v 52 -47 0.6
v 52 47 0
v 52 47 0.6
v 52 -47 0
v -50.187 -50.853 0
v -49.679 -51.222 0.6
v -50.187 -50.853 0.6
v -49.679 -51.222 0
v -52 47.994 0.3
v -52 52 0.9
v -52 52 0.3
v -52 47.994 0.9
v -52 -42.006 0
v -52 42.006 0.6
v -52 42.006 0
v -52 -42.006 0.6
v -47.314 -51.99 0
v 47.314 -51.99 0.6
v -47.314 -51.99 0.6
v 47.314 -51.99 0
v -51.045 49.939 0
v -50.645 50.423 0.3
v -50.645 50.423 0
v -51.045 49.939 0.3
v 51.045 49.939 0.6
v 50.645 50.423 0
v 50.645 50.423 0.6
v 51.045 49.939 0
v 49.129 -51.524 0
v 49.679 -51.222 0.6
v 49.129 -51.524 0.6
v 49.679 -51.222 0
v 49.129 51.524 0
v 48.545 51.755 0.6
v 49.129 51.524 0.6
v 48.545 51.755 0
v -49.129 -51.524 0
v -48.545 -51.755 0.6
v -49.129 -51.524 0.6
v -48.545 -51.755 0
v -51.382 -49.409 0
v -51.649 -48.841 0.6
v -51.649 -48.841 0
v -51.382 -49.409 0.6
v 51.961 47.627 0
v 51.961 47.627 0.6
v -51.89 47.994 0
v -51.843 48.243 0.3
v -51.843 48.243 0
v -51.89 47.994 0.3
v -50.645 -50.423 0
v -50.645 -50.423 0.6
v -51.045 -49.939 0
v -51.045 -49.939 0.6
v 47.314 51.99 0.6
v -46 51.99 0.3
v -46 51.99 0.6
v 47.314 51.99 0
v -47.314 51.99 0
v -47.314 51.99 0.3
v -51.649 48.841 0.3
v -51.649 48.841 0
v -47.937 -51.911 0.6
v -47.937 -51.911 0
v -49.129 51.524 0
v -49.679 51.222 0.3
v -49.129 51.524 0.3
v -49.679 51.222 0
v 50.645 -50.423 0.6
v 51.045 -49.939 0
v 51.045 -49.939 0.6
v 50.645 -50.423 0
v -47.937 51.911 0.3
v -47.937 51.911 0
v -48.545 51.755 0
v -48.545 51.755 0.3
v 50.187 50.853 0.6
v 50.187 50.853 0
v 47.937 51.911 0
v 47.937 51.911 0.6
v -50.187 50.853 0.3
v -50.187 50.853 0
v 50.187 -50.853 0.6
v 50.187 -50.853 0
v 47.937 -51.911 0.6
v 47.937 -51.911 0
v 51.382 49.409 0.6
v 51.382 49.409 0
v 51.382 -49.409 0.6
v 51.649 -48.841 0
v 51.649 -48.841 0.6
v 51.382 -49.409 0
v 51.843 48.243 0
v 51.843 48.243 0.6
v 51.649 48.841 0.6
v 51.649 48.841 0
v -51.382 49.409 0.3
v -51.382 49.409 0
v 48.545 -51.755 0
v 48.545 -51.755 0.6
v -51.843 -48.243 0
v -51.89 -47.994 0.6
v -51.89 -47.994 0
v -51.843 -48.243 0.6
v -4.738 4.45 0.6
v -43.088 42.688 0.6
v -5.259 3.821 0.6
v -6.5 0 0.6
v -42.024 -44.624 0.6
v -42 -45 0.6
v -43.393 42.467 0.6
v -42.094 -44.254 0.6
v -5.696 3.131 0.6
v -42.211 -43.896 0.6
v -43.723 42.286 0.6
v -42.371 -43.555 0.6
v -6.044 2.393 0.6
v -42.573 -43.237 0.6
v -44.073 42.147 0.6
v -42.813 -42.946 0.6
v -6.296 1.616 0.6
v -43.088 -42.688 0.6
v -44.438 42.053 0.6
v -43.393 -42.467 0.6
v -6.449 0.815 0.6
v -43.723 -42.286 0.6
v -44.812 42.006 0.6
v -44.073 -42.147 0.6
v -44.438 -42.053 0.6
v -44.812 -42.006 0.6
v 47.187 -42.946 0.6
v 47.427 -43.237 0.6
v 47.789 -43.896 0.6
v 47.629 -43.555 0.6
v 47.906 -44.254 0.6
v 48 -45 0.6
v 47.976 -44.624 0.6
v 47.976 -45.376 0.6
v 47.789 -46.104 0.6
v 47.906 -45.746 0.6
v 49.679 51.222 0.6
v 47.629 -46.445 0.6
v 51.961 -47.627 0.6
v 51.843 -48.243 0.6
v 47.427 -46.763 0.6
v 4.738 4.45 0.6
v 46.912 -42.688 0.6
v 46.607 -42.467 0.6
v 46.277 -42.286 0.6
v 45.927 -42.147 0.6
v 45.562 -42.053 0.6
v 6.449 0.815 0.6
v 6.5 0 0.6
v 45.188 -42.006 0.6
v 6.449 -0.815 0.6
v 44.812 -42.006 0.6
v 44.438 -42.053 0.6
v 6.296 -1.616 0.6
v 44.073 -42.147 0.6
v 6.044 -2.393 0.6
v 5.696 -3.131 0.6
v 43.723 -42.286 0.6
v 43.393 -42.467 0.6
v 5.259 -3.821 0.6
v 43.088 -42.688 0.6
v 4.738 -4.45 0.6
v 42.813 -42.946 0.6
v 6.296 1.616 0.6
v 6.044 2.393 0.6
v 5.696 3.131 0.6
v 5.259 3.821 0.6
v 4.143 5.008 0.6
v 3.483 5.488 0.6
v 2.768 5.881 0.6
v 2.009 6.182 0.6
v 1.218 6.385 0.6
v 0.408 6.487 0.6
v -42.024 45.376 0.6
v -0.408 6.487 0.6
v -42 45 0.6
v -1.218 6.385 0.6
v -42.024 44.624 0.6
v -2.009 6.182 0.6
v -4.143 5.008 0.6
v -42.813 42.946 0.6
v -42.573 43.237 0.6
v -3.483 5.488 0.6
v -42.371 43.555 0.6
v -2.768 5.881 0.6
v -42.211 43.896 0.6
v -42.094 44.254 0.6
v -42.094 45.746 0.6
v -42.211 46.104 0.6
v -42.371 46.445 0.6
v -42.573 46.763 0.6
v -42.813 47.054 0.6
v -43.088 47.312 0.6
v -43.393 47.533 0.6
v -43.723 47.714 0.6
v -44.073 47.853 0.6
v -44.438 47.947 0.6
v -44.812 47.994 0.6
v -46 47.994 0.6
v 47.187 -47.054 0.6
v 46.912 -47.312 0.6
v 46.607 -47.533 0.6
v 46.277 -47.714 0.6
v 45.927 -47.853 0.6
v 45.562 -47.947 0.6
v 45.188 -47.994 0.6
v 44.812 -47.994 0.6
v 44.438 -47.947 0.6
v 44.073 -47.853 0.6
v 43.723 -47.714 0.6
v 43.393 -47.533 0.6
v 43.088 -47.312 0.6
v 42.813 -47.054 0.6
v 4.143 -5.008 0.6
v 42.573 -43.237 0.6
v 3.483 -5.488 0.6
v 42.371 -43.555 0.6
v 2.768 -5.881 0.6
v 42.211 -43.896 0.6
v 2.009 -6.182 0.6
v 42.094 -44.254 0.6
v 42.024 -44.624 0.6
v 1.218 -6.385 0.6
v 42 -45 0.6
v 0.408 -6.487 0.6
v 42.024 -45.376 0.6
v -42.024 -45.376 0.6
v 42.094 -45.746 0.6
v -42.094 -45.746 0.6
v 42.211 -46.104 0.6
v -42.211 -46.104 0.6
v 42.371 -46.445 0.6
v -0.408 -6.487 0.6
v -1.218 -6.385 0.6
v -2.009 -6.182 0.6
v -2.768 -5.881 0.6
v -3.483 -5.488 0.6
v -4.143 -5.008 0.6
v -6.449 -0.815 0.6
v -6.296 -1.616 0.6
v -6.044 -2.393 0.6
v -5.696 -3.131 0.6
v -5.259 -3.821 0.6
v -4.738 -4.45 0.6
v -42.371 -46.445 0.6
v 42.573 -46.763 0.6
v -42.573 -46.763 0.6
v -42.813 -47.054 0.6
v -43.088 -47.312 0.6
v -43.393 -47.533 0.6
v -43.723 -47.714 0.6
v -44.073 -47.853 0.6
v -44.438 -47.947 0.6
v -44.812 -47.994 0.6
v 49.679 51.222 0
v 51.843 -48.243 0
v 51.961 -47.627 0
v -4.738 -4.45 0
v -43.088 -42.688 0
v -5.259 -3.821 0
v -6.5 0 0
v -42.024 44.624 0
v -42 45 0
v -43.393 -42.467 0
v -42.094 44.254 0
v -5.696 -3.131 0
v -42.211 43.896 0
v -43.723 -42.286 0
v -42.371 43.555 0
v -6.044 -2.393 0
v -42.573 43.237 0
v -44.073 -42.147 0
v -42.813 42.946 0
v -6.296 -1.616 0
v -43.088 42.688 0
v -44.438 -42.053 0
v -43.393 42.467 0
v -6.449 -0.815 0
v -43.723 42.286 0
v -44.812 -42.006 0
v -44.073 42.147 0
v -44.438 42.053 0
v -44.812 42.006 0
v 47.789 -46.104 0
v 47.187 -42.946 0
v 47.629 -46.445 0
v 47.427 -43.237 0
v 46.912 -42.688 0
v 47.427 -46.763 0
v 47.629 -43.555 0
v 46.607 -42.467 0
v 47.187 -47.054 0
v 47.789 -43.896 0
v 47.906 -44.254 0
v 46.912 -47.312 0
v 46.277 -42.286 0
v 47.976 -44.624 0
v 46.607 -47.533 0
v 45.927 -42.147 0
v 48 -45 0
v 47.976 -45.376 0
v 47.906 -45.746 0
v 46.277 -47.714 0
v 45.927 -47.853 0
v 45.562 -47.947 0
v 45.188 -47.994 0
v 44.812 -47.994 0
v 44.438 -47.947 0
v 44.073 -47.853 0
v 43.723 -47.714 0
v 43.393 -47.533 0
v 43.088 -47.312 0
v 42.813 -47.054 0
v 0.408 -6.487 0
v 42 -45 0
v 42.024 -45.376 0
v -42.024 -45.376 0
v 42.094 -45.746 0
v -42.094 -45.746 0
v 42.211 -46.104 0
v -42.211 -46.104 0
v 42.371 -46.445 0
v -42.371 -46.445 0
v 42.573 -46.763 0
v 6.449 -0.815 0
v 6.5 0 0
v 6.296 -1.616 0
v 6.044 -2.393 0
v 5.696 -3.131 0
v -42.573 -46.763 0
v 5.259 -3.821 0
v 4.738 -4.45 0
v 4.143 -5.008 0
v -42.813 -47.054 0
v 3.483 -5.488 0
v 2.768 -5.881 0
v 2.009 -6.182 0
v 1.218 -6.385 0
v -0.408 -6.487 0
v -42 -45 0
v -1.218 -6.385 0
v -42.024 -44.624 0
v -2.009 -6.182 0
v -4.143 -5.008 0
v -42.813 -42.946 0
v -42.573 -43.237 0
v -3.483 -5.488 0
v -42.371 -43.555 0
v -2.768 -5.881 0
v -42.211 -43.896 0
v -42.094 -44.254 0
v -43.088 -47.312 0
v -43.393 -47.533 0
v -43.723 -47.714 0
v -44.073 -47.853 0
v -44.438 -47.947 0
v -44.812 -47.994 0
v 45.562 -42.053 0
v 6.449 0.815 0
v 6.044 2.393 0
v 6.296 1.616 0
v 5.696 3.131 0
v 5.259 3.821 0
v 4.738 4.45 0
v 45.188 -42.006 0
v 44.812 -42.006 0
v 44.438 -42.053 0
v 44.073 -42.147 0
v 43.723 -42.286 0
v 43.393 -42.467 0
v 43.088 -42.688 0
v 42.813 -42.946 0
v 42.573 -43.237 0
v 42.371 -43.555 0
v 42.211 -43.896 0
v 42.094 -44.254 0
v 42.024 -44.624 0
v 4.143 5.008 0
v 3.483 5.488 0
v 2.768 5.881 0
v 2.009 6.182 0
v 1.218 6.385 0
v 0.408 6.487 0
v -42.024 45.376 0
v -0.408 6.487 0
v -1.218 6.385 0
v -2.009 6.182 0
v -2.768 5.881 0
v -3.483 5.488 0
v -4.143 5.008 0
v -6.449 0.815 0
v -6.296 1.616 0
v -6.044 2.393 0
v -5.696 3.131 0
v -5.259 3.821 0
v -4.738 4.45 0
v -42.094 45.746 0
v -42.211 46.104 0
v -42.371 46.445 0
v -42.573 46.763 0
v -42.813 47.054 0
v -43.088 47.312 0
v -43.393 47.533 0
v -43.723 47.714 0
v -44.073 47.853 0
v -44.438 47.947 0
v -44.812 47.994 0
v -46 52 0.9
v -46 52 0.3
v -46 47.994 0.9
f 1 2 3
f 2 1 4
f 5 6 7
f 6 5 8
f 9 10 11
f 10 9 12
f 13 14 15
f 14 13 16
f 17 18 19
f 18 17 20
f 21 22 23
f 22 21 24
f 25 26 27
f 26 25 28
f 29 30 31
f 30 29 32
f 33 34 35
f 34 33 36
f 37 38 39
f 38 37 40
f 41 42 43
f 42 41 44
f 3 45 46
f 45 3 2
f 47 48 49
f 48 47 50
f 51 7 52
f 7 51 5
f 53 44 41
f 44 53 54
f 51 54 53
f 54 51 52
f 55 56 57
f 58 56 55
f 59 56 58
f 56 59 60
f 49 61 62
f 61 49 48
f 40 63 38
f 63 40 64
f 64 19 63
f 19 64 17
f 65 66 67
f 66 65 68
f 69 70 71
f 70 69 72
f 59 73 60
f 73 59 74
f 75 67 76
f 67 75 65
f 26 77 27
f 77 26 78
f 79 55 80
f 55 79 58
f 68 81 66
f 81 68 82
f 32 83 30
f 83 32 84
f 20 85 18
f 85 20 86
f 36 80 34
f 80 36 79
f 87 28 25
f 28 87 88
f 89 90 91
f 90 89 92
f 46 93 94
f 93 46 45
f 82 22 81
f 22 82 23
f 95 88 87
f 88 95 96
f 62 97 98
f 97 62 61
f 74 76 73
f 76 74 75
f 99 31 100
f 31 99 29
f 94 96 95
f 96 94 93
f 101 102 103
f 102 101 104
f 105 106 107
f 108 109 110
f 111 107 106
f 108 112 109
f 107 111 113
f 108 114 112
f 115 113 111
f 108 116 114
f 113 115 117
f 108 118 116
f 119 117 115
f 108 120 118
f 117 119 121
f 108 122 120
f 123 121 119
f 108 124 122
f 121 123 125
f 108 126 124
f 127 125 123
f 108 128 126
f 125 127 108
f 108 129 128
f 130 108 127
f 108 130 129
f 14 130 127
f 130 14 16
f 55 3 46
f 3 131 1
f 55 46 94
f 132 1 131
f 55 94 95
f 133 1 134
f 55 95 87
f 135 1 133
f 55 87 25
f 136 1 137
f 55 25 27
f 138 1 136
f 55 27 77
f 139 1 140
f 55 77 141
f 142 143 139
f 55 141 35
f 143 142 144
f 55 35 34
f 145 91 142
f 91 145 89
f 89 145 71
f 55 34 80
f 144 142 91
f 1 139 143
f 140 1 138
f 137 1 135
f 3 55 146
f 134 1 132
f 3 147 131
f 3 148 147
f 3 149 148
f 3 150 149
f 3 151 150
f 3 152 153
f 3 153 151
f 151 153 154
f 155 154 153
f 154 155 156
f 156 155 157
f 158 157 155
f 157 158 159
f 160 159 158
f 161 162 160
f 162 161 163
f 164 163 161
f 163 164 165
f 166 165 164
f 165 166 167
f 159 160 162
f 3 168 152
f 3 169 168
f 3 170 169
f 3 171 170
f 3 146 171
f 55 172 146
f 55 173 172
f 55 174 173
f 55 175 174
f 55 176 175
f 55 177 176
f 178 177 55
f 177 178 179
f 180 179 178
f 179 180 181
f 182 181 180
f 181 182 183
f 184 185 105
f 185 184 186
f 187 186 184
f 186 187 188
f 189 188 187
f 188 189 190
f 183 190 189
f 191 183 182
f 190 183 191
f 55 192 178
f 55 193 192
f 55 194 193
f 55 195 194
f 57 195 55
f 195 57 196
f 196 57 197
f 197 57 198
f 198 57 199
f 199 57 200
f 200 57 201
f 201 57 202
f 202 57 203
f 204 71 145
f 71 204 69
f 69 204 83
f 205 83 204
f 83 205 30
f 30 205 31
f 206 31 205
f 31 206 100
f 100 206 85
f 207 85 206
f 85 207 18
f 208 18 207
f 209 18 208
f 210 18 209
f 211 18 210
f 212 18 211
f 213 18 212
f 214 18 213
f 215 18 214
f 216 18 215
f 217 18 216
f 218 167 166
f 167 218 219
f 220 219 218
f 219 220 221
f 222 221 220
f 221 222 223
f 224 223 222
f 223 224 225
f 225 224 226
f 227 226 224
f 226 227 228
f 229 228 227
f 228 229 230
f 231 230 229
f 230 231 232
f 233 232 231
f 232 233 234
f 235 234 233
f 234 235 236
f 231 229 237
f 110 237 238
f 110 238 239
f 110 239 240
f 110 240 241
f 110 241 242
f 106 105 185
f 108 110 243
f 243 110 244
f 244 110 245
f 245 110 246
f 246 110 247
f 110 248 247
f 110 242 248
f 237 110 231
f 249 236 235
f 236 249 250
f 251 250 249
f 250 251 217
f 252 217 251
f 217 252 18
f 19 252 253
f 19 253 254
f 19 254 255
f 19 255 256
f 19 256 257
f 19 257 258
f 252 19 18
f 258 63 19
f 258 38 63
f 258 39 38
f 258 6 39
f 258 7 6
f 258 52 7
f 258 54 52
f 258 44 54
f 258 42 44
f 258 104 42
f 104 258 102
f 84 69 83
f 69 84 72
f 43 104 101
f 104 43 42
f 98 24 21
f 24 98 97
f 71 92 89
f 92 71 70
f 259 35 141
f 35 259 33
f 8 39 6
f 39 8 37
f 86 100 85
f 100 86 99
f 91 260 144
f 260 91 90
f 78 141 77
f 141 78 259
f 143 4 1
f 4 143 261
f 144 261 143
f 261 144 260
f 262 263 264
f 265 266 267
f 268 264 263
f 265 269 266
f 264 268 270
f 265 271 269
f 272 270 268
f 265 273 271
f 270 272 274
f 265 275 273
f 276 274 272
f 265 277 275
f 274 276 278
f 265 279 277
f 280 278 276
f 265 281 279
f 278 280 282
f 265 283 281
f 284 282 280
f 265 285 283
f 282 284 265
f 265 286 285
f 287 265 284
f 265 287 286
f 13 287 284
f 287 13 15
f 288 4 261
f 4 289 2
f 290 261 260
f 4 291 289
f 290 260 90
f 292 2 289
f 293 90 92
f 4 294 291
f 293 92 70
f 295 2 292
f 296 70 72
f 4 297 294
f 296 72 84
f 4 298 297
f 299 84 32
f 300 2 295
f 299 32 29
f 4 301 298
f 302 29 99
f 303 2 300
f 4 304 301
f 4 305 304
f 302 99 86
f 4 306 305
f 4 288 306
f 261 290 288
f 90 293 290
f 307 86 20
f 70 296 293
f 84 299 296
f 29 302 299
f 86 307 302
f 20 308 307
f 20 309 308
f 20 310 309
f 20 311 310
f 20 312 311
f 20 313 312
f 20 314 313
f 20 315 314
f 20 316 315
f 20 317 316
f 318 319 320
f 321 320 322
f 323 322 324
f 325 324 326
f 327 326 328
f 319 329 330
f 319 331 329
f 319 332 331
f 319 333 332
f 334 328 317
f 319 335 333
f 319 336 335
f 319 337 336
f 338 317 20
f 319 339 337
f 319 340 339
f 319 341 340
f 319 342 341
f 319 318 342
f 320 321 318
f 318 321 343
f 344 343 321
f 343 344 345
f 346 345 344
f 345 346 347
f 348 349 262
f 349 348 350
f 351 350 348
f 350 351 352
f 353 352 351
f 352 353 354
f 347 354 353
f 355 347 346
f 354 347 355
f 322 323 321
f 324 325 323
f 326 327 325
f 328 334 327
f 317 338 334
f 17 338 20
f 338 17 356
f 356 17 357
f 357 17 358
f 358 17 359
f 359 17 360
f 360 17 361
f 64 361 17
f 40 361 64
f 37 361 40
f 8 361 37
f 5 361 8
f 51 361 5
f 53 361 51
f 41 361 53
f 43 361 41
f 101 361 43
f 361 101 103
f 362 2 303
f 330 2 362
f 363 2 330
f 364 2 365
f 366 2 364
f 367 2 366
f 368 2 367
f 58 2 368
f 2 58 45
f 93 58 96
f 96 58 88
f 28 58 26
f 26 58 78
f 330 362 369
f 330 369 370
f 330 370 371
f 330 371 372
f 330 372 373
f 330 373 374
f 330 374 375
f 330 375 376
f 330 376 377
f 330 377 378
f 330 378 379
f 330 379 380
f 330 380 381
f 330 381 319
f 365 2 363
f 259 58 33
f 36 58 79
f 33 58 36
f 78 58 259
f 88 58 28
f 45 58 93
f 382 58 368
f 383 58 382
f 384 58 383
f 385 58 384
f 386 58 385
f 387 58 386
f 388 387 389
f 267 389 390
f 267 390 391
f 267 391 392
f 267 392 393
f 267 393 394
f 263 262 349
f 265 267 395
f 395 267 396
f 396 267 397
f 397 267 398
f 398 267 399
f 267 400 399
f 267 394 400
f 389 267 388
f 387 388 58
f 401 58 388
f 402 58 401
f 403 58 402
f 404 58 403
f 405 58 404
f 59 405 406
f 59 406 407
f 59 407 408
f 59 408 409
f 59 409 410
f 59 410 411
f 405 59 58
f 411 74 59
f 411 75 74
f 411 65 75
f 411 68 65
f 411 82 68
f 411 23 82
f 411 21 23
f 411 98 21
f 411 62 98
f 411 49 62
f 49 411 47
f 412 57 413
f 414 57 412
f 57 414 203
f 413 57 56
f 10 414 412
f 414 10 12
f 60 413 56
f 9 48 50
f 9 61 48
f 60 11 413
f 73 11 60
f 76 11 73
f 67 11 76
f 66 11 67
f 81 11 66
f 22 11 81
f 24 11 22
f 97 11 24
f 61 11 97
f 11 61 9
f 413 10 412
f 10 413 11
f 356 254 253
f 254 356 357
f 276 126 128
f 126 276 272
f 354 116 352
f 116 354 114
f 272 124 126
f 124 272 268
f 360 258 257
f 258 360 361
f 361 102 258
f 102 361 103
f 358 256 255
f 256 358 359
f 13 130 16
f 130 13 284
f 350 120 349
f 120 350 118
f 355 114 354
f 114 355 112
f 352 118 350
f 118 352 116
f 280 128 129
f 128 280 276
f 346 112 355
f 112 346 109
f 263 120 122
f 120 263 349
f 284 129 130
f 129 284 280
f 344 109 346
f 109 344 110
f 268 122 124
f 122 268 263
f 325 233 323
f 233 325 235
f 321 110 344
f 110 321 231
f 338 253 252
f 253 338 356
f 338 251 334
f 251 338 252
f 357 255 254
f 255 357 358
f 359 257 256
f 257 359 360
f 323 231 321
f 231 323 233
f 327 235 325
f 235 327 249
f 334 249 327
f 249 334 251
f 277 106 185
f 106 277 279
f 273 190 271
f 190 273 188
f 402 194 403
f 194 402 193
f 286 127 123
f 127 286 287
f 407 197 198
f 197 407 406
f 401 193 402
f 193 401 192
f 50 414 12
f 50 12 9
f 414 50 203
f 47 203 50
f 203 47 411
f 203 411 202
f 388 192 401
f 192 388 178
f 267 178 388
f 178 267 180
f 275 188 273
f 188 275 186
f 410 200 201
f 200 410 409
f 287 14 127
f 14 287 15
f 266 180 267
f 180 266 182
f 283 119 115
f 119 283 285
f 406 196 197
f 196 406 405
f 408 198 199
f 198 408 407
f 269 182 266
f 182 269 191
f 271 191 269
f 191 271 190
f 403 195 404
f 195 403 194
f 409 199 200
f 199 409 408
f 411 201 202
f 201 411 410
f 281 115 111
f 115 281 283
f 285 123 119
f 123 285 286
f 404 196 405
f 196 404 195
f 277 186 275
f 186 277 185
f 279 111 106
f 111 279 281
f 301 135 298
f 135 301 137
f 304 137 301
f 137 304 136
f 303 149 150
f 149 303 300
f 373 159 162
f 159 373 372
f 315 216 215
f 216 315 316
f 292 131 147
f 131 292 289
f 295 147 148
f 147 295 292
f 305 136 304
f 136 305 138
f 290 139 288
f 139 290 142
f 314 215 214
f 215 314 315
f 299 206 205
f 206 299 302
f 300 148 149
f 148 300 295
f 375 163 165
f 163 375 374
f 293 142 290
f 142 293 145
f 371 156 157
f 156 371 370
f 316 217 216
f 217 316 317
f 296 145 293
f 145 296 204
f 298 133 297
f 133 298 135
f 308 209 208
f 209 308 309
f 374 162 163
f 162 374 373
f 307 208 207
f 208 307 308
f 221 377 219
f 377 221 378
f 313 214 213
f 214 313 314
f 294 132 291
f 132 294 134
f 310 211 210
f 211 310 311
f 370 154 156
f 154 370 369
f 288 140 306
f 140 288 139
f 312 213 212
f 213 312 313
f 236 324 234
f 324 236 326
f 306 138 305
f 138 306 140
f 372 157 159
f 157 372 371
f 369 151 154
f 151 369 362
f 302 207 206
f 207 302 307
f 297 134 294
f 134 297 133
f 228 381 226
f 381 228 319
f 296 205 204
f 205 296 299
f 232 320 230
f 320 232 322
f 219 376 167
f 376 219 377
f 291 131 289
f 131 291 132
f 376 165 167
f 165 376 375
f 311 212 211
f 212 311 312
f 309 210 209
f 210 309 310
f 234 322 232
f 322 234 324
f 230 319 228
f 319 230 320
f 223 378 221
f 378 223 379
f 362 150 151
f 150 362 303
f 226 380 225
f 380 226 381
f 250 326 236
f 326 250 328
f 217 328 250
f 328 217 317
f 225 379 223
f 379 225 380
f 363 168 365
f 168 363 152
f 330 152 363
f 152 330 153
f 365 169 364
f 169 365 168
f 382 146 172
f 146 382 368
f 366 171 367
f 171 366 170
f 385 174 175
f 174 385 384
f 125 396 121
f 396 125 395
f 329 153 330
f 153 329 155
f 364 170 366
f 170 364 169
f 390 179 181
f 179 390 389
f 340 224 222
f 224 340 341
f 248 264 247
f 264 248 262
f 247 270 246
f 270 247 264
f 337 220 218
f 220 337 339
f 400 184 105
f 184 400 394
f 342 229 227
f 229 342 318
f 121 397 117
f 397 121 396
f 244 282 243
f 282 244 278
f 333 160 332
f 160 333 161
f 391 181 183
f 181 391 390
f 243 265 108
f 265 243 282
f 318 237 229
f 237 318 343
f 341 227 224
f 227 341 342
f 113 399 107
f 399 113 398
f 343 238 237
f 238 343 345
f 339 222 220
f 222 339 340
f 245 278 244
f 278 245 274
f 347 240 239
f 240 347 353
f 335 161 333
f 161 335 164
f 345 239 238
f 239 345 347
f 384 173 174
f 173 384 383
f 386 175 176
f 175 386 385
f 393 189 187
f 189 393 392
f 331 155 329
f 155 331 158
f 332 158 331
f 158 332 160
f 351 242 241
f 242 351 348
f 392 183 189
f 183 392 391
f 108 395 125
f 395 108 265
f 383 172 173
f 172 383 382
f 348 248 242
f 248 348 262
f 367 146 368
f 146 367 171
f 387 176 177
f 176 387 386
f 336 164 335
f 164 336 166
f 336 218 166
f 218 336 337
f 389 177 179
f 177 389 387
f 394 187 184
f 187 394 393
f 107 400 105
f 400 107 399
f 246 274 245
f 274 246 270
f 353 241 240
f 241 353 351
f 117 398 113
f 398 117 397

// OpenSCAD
$fn = 50;


difference() {
	union() {
		translate(v = [0, 0, 0]) {
			rotate(a = [0, 0, 0]) {
				hull() {
					translate(v = [-47.0000000000, 47.0000000000, 0]) {
						rotate(a = [0, 0, 0]) {
							translate(v = [0, 0, 0]) {
								rotate(a = [0, 0, 0]) {
									cylinder(h = 0.6000000000, r = 5);
								}
							}
						}
					}
					translate(v = [47.0000000000, 47.0000000000, 0]) {
						rotate(a = [0, 0, 0]) {
							translate(v = [0, 0, 0]) {
								rotate(a = [0, 0, 0]) {
									cylinder(h = 0.6000000000, r = 5);
								}
							}
						}
					}
					translate(v = [-47.0000000000, -47.0000000000, 0]) {
						rotate(a = [0, 0, 0]) {
							translate(v = [0, 0, 0]) {
								rotate(a = [0, 0, 0]) {
									cylinder(h = 0.6000000000, r = 5);
								}
							}
						}
					}
					translate(v = [47.0000000000, -47.0000000000, 0]) {
						rotate(a = [0, 0, 0]) {
							translate(v = [0, 0, 0]) {
								rotate(a = [0, 0, 0]) {
									cylinder(h = 0.6000000000, r = 5);
								}
							}
						}
					}
				}
			}
		}
		#translate(v = [-52.0000000000, 46.0000000000, 0.3000000000]) {
			rotate(a = [0, 0, 0]) {
				cube(size = [6, 6, 0.6000000000]);
			}
		}
	}
	union() {
		translate(v = [-52.5000000000, -45.0000000000, -125]) {
			rotate(a = [0, 0, 0]) {
				hull() {
					translate(v = [7.5000000000, 0, 0]) {
						rotate(a = [0, 0, 0]) {
							translate(v = [0, 0, 0]) {
								rotate(a = [0, 0, 0]) {
									cylinder(h = 250, r = 3.0000000000);
								}
							}
						}
					}
					translate(v = [-7.5000000000, 0, 0]) {
						rotate(a = [0, 0, 0]) {
							translate(v = [0, 0, 0]) {
								rotate(a = [0, 0, 0]) {
									cylinder(h = 250, r = 3.0000000000);
								}
							}
						}
					}
				}
			}
		}
		translate(v = [-52.5000000000, 45.0000000000, -125]) {
			rotate(a = [0, 0, 0]) {
				hull() {
					translate(v = [7.5000000000, 0, 0]) {
						rotate(a = [0, 0, 0]) {
							translate(v = [0, 0, 0]) {
								rotate(a = [0, 0, 0]) {
									cylinder(h = 250, r = 3.0000000000);
								}
							}
						}
					}
					translate(v = [-7.5000000000, 0, 0]) {
						rotate(a = [0, 0, 0]) {
							translate(v = [0, 0, 0]) {
								rotate(a = [0, 0, 0]) {
									cylinder(h = 250, r = 3.0000000000);
								}
							}
						}
					}
				}
			}
		}
		translate(v = [45.0000000000, -45.0000000000, -125.0000000000]) {
			rotate(a = [0, 0, 0]) {
				cylinder(h = 250, r = 3.0000000000);
			}
		}
		translate(v = [0, 0, 0.0000000000]) {
			rotate(a = [0, 0, 0]) {
				cylinder(h = 0.6000000000, r = 6.5000000000);
			}
		}
	}
}
